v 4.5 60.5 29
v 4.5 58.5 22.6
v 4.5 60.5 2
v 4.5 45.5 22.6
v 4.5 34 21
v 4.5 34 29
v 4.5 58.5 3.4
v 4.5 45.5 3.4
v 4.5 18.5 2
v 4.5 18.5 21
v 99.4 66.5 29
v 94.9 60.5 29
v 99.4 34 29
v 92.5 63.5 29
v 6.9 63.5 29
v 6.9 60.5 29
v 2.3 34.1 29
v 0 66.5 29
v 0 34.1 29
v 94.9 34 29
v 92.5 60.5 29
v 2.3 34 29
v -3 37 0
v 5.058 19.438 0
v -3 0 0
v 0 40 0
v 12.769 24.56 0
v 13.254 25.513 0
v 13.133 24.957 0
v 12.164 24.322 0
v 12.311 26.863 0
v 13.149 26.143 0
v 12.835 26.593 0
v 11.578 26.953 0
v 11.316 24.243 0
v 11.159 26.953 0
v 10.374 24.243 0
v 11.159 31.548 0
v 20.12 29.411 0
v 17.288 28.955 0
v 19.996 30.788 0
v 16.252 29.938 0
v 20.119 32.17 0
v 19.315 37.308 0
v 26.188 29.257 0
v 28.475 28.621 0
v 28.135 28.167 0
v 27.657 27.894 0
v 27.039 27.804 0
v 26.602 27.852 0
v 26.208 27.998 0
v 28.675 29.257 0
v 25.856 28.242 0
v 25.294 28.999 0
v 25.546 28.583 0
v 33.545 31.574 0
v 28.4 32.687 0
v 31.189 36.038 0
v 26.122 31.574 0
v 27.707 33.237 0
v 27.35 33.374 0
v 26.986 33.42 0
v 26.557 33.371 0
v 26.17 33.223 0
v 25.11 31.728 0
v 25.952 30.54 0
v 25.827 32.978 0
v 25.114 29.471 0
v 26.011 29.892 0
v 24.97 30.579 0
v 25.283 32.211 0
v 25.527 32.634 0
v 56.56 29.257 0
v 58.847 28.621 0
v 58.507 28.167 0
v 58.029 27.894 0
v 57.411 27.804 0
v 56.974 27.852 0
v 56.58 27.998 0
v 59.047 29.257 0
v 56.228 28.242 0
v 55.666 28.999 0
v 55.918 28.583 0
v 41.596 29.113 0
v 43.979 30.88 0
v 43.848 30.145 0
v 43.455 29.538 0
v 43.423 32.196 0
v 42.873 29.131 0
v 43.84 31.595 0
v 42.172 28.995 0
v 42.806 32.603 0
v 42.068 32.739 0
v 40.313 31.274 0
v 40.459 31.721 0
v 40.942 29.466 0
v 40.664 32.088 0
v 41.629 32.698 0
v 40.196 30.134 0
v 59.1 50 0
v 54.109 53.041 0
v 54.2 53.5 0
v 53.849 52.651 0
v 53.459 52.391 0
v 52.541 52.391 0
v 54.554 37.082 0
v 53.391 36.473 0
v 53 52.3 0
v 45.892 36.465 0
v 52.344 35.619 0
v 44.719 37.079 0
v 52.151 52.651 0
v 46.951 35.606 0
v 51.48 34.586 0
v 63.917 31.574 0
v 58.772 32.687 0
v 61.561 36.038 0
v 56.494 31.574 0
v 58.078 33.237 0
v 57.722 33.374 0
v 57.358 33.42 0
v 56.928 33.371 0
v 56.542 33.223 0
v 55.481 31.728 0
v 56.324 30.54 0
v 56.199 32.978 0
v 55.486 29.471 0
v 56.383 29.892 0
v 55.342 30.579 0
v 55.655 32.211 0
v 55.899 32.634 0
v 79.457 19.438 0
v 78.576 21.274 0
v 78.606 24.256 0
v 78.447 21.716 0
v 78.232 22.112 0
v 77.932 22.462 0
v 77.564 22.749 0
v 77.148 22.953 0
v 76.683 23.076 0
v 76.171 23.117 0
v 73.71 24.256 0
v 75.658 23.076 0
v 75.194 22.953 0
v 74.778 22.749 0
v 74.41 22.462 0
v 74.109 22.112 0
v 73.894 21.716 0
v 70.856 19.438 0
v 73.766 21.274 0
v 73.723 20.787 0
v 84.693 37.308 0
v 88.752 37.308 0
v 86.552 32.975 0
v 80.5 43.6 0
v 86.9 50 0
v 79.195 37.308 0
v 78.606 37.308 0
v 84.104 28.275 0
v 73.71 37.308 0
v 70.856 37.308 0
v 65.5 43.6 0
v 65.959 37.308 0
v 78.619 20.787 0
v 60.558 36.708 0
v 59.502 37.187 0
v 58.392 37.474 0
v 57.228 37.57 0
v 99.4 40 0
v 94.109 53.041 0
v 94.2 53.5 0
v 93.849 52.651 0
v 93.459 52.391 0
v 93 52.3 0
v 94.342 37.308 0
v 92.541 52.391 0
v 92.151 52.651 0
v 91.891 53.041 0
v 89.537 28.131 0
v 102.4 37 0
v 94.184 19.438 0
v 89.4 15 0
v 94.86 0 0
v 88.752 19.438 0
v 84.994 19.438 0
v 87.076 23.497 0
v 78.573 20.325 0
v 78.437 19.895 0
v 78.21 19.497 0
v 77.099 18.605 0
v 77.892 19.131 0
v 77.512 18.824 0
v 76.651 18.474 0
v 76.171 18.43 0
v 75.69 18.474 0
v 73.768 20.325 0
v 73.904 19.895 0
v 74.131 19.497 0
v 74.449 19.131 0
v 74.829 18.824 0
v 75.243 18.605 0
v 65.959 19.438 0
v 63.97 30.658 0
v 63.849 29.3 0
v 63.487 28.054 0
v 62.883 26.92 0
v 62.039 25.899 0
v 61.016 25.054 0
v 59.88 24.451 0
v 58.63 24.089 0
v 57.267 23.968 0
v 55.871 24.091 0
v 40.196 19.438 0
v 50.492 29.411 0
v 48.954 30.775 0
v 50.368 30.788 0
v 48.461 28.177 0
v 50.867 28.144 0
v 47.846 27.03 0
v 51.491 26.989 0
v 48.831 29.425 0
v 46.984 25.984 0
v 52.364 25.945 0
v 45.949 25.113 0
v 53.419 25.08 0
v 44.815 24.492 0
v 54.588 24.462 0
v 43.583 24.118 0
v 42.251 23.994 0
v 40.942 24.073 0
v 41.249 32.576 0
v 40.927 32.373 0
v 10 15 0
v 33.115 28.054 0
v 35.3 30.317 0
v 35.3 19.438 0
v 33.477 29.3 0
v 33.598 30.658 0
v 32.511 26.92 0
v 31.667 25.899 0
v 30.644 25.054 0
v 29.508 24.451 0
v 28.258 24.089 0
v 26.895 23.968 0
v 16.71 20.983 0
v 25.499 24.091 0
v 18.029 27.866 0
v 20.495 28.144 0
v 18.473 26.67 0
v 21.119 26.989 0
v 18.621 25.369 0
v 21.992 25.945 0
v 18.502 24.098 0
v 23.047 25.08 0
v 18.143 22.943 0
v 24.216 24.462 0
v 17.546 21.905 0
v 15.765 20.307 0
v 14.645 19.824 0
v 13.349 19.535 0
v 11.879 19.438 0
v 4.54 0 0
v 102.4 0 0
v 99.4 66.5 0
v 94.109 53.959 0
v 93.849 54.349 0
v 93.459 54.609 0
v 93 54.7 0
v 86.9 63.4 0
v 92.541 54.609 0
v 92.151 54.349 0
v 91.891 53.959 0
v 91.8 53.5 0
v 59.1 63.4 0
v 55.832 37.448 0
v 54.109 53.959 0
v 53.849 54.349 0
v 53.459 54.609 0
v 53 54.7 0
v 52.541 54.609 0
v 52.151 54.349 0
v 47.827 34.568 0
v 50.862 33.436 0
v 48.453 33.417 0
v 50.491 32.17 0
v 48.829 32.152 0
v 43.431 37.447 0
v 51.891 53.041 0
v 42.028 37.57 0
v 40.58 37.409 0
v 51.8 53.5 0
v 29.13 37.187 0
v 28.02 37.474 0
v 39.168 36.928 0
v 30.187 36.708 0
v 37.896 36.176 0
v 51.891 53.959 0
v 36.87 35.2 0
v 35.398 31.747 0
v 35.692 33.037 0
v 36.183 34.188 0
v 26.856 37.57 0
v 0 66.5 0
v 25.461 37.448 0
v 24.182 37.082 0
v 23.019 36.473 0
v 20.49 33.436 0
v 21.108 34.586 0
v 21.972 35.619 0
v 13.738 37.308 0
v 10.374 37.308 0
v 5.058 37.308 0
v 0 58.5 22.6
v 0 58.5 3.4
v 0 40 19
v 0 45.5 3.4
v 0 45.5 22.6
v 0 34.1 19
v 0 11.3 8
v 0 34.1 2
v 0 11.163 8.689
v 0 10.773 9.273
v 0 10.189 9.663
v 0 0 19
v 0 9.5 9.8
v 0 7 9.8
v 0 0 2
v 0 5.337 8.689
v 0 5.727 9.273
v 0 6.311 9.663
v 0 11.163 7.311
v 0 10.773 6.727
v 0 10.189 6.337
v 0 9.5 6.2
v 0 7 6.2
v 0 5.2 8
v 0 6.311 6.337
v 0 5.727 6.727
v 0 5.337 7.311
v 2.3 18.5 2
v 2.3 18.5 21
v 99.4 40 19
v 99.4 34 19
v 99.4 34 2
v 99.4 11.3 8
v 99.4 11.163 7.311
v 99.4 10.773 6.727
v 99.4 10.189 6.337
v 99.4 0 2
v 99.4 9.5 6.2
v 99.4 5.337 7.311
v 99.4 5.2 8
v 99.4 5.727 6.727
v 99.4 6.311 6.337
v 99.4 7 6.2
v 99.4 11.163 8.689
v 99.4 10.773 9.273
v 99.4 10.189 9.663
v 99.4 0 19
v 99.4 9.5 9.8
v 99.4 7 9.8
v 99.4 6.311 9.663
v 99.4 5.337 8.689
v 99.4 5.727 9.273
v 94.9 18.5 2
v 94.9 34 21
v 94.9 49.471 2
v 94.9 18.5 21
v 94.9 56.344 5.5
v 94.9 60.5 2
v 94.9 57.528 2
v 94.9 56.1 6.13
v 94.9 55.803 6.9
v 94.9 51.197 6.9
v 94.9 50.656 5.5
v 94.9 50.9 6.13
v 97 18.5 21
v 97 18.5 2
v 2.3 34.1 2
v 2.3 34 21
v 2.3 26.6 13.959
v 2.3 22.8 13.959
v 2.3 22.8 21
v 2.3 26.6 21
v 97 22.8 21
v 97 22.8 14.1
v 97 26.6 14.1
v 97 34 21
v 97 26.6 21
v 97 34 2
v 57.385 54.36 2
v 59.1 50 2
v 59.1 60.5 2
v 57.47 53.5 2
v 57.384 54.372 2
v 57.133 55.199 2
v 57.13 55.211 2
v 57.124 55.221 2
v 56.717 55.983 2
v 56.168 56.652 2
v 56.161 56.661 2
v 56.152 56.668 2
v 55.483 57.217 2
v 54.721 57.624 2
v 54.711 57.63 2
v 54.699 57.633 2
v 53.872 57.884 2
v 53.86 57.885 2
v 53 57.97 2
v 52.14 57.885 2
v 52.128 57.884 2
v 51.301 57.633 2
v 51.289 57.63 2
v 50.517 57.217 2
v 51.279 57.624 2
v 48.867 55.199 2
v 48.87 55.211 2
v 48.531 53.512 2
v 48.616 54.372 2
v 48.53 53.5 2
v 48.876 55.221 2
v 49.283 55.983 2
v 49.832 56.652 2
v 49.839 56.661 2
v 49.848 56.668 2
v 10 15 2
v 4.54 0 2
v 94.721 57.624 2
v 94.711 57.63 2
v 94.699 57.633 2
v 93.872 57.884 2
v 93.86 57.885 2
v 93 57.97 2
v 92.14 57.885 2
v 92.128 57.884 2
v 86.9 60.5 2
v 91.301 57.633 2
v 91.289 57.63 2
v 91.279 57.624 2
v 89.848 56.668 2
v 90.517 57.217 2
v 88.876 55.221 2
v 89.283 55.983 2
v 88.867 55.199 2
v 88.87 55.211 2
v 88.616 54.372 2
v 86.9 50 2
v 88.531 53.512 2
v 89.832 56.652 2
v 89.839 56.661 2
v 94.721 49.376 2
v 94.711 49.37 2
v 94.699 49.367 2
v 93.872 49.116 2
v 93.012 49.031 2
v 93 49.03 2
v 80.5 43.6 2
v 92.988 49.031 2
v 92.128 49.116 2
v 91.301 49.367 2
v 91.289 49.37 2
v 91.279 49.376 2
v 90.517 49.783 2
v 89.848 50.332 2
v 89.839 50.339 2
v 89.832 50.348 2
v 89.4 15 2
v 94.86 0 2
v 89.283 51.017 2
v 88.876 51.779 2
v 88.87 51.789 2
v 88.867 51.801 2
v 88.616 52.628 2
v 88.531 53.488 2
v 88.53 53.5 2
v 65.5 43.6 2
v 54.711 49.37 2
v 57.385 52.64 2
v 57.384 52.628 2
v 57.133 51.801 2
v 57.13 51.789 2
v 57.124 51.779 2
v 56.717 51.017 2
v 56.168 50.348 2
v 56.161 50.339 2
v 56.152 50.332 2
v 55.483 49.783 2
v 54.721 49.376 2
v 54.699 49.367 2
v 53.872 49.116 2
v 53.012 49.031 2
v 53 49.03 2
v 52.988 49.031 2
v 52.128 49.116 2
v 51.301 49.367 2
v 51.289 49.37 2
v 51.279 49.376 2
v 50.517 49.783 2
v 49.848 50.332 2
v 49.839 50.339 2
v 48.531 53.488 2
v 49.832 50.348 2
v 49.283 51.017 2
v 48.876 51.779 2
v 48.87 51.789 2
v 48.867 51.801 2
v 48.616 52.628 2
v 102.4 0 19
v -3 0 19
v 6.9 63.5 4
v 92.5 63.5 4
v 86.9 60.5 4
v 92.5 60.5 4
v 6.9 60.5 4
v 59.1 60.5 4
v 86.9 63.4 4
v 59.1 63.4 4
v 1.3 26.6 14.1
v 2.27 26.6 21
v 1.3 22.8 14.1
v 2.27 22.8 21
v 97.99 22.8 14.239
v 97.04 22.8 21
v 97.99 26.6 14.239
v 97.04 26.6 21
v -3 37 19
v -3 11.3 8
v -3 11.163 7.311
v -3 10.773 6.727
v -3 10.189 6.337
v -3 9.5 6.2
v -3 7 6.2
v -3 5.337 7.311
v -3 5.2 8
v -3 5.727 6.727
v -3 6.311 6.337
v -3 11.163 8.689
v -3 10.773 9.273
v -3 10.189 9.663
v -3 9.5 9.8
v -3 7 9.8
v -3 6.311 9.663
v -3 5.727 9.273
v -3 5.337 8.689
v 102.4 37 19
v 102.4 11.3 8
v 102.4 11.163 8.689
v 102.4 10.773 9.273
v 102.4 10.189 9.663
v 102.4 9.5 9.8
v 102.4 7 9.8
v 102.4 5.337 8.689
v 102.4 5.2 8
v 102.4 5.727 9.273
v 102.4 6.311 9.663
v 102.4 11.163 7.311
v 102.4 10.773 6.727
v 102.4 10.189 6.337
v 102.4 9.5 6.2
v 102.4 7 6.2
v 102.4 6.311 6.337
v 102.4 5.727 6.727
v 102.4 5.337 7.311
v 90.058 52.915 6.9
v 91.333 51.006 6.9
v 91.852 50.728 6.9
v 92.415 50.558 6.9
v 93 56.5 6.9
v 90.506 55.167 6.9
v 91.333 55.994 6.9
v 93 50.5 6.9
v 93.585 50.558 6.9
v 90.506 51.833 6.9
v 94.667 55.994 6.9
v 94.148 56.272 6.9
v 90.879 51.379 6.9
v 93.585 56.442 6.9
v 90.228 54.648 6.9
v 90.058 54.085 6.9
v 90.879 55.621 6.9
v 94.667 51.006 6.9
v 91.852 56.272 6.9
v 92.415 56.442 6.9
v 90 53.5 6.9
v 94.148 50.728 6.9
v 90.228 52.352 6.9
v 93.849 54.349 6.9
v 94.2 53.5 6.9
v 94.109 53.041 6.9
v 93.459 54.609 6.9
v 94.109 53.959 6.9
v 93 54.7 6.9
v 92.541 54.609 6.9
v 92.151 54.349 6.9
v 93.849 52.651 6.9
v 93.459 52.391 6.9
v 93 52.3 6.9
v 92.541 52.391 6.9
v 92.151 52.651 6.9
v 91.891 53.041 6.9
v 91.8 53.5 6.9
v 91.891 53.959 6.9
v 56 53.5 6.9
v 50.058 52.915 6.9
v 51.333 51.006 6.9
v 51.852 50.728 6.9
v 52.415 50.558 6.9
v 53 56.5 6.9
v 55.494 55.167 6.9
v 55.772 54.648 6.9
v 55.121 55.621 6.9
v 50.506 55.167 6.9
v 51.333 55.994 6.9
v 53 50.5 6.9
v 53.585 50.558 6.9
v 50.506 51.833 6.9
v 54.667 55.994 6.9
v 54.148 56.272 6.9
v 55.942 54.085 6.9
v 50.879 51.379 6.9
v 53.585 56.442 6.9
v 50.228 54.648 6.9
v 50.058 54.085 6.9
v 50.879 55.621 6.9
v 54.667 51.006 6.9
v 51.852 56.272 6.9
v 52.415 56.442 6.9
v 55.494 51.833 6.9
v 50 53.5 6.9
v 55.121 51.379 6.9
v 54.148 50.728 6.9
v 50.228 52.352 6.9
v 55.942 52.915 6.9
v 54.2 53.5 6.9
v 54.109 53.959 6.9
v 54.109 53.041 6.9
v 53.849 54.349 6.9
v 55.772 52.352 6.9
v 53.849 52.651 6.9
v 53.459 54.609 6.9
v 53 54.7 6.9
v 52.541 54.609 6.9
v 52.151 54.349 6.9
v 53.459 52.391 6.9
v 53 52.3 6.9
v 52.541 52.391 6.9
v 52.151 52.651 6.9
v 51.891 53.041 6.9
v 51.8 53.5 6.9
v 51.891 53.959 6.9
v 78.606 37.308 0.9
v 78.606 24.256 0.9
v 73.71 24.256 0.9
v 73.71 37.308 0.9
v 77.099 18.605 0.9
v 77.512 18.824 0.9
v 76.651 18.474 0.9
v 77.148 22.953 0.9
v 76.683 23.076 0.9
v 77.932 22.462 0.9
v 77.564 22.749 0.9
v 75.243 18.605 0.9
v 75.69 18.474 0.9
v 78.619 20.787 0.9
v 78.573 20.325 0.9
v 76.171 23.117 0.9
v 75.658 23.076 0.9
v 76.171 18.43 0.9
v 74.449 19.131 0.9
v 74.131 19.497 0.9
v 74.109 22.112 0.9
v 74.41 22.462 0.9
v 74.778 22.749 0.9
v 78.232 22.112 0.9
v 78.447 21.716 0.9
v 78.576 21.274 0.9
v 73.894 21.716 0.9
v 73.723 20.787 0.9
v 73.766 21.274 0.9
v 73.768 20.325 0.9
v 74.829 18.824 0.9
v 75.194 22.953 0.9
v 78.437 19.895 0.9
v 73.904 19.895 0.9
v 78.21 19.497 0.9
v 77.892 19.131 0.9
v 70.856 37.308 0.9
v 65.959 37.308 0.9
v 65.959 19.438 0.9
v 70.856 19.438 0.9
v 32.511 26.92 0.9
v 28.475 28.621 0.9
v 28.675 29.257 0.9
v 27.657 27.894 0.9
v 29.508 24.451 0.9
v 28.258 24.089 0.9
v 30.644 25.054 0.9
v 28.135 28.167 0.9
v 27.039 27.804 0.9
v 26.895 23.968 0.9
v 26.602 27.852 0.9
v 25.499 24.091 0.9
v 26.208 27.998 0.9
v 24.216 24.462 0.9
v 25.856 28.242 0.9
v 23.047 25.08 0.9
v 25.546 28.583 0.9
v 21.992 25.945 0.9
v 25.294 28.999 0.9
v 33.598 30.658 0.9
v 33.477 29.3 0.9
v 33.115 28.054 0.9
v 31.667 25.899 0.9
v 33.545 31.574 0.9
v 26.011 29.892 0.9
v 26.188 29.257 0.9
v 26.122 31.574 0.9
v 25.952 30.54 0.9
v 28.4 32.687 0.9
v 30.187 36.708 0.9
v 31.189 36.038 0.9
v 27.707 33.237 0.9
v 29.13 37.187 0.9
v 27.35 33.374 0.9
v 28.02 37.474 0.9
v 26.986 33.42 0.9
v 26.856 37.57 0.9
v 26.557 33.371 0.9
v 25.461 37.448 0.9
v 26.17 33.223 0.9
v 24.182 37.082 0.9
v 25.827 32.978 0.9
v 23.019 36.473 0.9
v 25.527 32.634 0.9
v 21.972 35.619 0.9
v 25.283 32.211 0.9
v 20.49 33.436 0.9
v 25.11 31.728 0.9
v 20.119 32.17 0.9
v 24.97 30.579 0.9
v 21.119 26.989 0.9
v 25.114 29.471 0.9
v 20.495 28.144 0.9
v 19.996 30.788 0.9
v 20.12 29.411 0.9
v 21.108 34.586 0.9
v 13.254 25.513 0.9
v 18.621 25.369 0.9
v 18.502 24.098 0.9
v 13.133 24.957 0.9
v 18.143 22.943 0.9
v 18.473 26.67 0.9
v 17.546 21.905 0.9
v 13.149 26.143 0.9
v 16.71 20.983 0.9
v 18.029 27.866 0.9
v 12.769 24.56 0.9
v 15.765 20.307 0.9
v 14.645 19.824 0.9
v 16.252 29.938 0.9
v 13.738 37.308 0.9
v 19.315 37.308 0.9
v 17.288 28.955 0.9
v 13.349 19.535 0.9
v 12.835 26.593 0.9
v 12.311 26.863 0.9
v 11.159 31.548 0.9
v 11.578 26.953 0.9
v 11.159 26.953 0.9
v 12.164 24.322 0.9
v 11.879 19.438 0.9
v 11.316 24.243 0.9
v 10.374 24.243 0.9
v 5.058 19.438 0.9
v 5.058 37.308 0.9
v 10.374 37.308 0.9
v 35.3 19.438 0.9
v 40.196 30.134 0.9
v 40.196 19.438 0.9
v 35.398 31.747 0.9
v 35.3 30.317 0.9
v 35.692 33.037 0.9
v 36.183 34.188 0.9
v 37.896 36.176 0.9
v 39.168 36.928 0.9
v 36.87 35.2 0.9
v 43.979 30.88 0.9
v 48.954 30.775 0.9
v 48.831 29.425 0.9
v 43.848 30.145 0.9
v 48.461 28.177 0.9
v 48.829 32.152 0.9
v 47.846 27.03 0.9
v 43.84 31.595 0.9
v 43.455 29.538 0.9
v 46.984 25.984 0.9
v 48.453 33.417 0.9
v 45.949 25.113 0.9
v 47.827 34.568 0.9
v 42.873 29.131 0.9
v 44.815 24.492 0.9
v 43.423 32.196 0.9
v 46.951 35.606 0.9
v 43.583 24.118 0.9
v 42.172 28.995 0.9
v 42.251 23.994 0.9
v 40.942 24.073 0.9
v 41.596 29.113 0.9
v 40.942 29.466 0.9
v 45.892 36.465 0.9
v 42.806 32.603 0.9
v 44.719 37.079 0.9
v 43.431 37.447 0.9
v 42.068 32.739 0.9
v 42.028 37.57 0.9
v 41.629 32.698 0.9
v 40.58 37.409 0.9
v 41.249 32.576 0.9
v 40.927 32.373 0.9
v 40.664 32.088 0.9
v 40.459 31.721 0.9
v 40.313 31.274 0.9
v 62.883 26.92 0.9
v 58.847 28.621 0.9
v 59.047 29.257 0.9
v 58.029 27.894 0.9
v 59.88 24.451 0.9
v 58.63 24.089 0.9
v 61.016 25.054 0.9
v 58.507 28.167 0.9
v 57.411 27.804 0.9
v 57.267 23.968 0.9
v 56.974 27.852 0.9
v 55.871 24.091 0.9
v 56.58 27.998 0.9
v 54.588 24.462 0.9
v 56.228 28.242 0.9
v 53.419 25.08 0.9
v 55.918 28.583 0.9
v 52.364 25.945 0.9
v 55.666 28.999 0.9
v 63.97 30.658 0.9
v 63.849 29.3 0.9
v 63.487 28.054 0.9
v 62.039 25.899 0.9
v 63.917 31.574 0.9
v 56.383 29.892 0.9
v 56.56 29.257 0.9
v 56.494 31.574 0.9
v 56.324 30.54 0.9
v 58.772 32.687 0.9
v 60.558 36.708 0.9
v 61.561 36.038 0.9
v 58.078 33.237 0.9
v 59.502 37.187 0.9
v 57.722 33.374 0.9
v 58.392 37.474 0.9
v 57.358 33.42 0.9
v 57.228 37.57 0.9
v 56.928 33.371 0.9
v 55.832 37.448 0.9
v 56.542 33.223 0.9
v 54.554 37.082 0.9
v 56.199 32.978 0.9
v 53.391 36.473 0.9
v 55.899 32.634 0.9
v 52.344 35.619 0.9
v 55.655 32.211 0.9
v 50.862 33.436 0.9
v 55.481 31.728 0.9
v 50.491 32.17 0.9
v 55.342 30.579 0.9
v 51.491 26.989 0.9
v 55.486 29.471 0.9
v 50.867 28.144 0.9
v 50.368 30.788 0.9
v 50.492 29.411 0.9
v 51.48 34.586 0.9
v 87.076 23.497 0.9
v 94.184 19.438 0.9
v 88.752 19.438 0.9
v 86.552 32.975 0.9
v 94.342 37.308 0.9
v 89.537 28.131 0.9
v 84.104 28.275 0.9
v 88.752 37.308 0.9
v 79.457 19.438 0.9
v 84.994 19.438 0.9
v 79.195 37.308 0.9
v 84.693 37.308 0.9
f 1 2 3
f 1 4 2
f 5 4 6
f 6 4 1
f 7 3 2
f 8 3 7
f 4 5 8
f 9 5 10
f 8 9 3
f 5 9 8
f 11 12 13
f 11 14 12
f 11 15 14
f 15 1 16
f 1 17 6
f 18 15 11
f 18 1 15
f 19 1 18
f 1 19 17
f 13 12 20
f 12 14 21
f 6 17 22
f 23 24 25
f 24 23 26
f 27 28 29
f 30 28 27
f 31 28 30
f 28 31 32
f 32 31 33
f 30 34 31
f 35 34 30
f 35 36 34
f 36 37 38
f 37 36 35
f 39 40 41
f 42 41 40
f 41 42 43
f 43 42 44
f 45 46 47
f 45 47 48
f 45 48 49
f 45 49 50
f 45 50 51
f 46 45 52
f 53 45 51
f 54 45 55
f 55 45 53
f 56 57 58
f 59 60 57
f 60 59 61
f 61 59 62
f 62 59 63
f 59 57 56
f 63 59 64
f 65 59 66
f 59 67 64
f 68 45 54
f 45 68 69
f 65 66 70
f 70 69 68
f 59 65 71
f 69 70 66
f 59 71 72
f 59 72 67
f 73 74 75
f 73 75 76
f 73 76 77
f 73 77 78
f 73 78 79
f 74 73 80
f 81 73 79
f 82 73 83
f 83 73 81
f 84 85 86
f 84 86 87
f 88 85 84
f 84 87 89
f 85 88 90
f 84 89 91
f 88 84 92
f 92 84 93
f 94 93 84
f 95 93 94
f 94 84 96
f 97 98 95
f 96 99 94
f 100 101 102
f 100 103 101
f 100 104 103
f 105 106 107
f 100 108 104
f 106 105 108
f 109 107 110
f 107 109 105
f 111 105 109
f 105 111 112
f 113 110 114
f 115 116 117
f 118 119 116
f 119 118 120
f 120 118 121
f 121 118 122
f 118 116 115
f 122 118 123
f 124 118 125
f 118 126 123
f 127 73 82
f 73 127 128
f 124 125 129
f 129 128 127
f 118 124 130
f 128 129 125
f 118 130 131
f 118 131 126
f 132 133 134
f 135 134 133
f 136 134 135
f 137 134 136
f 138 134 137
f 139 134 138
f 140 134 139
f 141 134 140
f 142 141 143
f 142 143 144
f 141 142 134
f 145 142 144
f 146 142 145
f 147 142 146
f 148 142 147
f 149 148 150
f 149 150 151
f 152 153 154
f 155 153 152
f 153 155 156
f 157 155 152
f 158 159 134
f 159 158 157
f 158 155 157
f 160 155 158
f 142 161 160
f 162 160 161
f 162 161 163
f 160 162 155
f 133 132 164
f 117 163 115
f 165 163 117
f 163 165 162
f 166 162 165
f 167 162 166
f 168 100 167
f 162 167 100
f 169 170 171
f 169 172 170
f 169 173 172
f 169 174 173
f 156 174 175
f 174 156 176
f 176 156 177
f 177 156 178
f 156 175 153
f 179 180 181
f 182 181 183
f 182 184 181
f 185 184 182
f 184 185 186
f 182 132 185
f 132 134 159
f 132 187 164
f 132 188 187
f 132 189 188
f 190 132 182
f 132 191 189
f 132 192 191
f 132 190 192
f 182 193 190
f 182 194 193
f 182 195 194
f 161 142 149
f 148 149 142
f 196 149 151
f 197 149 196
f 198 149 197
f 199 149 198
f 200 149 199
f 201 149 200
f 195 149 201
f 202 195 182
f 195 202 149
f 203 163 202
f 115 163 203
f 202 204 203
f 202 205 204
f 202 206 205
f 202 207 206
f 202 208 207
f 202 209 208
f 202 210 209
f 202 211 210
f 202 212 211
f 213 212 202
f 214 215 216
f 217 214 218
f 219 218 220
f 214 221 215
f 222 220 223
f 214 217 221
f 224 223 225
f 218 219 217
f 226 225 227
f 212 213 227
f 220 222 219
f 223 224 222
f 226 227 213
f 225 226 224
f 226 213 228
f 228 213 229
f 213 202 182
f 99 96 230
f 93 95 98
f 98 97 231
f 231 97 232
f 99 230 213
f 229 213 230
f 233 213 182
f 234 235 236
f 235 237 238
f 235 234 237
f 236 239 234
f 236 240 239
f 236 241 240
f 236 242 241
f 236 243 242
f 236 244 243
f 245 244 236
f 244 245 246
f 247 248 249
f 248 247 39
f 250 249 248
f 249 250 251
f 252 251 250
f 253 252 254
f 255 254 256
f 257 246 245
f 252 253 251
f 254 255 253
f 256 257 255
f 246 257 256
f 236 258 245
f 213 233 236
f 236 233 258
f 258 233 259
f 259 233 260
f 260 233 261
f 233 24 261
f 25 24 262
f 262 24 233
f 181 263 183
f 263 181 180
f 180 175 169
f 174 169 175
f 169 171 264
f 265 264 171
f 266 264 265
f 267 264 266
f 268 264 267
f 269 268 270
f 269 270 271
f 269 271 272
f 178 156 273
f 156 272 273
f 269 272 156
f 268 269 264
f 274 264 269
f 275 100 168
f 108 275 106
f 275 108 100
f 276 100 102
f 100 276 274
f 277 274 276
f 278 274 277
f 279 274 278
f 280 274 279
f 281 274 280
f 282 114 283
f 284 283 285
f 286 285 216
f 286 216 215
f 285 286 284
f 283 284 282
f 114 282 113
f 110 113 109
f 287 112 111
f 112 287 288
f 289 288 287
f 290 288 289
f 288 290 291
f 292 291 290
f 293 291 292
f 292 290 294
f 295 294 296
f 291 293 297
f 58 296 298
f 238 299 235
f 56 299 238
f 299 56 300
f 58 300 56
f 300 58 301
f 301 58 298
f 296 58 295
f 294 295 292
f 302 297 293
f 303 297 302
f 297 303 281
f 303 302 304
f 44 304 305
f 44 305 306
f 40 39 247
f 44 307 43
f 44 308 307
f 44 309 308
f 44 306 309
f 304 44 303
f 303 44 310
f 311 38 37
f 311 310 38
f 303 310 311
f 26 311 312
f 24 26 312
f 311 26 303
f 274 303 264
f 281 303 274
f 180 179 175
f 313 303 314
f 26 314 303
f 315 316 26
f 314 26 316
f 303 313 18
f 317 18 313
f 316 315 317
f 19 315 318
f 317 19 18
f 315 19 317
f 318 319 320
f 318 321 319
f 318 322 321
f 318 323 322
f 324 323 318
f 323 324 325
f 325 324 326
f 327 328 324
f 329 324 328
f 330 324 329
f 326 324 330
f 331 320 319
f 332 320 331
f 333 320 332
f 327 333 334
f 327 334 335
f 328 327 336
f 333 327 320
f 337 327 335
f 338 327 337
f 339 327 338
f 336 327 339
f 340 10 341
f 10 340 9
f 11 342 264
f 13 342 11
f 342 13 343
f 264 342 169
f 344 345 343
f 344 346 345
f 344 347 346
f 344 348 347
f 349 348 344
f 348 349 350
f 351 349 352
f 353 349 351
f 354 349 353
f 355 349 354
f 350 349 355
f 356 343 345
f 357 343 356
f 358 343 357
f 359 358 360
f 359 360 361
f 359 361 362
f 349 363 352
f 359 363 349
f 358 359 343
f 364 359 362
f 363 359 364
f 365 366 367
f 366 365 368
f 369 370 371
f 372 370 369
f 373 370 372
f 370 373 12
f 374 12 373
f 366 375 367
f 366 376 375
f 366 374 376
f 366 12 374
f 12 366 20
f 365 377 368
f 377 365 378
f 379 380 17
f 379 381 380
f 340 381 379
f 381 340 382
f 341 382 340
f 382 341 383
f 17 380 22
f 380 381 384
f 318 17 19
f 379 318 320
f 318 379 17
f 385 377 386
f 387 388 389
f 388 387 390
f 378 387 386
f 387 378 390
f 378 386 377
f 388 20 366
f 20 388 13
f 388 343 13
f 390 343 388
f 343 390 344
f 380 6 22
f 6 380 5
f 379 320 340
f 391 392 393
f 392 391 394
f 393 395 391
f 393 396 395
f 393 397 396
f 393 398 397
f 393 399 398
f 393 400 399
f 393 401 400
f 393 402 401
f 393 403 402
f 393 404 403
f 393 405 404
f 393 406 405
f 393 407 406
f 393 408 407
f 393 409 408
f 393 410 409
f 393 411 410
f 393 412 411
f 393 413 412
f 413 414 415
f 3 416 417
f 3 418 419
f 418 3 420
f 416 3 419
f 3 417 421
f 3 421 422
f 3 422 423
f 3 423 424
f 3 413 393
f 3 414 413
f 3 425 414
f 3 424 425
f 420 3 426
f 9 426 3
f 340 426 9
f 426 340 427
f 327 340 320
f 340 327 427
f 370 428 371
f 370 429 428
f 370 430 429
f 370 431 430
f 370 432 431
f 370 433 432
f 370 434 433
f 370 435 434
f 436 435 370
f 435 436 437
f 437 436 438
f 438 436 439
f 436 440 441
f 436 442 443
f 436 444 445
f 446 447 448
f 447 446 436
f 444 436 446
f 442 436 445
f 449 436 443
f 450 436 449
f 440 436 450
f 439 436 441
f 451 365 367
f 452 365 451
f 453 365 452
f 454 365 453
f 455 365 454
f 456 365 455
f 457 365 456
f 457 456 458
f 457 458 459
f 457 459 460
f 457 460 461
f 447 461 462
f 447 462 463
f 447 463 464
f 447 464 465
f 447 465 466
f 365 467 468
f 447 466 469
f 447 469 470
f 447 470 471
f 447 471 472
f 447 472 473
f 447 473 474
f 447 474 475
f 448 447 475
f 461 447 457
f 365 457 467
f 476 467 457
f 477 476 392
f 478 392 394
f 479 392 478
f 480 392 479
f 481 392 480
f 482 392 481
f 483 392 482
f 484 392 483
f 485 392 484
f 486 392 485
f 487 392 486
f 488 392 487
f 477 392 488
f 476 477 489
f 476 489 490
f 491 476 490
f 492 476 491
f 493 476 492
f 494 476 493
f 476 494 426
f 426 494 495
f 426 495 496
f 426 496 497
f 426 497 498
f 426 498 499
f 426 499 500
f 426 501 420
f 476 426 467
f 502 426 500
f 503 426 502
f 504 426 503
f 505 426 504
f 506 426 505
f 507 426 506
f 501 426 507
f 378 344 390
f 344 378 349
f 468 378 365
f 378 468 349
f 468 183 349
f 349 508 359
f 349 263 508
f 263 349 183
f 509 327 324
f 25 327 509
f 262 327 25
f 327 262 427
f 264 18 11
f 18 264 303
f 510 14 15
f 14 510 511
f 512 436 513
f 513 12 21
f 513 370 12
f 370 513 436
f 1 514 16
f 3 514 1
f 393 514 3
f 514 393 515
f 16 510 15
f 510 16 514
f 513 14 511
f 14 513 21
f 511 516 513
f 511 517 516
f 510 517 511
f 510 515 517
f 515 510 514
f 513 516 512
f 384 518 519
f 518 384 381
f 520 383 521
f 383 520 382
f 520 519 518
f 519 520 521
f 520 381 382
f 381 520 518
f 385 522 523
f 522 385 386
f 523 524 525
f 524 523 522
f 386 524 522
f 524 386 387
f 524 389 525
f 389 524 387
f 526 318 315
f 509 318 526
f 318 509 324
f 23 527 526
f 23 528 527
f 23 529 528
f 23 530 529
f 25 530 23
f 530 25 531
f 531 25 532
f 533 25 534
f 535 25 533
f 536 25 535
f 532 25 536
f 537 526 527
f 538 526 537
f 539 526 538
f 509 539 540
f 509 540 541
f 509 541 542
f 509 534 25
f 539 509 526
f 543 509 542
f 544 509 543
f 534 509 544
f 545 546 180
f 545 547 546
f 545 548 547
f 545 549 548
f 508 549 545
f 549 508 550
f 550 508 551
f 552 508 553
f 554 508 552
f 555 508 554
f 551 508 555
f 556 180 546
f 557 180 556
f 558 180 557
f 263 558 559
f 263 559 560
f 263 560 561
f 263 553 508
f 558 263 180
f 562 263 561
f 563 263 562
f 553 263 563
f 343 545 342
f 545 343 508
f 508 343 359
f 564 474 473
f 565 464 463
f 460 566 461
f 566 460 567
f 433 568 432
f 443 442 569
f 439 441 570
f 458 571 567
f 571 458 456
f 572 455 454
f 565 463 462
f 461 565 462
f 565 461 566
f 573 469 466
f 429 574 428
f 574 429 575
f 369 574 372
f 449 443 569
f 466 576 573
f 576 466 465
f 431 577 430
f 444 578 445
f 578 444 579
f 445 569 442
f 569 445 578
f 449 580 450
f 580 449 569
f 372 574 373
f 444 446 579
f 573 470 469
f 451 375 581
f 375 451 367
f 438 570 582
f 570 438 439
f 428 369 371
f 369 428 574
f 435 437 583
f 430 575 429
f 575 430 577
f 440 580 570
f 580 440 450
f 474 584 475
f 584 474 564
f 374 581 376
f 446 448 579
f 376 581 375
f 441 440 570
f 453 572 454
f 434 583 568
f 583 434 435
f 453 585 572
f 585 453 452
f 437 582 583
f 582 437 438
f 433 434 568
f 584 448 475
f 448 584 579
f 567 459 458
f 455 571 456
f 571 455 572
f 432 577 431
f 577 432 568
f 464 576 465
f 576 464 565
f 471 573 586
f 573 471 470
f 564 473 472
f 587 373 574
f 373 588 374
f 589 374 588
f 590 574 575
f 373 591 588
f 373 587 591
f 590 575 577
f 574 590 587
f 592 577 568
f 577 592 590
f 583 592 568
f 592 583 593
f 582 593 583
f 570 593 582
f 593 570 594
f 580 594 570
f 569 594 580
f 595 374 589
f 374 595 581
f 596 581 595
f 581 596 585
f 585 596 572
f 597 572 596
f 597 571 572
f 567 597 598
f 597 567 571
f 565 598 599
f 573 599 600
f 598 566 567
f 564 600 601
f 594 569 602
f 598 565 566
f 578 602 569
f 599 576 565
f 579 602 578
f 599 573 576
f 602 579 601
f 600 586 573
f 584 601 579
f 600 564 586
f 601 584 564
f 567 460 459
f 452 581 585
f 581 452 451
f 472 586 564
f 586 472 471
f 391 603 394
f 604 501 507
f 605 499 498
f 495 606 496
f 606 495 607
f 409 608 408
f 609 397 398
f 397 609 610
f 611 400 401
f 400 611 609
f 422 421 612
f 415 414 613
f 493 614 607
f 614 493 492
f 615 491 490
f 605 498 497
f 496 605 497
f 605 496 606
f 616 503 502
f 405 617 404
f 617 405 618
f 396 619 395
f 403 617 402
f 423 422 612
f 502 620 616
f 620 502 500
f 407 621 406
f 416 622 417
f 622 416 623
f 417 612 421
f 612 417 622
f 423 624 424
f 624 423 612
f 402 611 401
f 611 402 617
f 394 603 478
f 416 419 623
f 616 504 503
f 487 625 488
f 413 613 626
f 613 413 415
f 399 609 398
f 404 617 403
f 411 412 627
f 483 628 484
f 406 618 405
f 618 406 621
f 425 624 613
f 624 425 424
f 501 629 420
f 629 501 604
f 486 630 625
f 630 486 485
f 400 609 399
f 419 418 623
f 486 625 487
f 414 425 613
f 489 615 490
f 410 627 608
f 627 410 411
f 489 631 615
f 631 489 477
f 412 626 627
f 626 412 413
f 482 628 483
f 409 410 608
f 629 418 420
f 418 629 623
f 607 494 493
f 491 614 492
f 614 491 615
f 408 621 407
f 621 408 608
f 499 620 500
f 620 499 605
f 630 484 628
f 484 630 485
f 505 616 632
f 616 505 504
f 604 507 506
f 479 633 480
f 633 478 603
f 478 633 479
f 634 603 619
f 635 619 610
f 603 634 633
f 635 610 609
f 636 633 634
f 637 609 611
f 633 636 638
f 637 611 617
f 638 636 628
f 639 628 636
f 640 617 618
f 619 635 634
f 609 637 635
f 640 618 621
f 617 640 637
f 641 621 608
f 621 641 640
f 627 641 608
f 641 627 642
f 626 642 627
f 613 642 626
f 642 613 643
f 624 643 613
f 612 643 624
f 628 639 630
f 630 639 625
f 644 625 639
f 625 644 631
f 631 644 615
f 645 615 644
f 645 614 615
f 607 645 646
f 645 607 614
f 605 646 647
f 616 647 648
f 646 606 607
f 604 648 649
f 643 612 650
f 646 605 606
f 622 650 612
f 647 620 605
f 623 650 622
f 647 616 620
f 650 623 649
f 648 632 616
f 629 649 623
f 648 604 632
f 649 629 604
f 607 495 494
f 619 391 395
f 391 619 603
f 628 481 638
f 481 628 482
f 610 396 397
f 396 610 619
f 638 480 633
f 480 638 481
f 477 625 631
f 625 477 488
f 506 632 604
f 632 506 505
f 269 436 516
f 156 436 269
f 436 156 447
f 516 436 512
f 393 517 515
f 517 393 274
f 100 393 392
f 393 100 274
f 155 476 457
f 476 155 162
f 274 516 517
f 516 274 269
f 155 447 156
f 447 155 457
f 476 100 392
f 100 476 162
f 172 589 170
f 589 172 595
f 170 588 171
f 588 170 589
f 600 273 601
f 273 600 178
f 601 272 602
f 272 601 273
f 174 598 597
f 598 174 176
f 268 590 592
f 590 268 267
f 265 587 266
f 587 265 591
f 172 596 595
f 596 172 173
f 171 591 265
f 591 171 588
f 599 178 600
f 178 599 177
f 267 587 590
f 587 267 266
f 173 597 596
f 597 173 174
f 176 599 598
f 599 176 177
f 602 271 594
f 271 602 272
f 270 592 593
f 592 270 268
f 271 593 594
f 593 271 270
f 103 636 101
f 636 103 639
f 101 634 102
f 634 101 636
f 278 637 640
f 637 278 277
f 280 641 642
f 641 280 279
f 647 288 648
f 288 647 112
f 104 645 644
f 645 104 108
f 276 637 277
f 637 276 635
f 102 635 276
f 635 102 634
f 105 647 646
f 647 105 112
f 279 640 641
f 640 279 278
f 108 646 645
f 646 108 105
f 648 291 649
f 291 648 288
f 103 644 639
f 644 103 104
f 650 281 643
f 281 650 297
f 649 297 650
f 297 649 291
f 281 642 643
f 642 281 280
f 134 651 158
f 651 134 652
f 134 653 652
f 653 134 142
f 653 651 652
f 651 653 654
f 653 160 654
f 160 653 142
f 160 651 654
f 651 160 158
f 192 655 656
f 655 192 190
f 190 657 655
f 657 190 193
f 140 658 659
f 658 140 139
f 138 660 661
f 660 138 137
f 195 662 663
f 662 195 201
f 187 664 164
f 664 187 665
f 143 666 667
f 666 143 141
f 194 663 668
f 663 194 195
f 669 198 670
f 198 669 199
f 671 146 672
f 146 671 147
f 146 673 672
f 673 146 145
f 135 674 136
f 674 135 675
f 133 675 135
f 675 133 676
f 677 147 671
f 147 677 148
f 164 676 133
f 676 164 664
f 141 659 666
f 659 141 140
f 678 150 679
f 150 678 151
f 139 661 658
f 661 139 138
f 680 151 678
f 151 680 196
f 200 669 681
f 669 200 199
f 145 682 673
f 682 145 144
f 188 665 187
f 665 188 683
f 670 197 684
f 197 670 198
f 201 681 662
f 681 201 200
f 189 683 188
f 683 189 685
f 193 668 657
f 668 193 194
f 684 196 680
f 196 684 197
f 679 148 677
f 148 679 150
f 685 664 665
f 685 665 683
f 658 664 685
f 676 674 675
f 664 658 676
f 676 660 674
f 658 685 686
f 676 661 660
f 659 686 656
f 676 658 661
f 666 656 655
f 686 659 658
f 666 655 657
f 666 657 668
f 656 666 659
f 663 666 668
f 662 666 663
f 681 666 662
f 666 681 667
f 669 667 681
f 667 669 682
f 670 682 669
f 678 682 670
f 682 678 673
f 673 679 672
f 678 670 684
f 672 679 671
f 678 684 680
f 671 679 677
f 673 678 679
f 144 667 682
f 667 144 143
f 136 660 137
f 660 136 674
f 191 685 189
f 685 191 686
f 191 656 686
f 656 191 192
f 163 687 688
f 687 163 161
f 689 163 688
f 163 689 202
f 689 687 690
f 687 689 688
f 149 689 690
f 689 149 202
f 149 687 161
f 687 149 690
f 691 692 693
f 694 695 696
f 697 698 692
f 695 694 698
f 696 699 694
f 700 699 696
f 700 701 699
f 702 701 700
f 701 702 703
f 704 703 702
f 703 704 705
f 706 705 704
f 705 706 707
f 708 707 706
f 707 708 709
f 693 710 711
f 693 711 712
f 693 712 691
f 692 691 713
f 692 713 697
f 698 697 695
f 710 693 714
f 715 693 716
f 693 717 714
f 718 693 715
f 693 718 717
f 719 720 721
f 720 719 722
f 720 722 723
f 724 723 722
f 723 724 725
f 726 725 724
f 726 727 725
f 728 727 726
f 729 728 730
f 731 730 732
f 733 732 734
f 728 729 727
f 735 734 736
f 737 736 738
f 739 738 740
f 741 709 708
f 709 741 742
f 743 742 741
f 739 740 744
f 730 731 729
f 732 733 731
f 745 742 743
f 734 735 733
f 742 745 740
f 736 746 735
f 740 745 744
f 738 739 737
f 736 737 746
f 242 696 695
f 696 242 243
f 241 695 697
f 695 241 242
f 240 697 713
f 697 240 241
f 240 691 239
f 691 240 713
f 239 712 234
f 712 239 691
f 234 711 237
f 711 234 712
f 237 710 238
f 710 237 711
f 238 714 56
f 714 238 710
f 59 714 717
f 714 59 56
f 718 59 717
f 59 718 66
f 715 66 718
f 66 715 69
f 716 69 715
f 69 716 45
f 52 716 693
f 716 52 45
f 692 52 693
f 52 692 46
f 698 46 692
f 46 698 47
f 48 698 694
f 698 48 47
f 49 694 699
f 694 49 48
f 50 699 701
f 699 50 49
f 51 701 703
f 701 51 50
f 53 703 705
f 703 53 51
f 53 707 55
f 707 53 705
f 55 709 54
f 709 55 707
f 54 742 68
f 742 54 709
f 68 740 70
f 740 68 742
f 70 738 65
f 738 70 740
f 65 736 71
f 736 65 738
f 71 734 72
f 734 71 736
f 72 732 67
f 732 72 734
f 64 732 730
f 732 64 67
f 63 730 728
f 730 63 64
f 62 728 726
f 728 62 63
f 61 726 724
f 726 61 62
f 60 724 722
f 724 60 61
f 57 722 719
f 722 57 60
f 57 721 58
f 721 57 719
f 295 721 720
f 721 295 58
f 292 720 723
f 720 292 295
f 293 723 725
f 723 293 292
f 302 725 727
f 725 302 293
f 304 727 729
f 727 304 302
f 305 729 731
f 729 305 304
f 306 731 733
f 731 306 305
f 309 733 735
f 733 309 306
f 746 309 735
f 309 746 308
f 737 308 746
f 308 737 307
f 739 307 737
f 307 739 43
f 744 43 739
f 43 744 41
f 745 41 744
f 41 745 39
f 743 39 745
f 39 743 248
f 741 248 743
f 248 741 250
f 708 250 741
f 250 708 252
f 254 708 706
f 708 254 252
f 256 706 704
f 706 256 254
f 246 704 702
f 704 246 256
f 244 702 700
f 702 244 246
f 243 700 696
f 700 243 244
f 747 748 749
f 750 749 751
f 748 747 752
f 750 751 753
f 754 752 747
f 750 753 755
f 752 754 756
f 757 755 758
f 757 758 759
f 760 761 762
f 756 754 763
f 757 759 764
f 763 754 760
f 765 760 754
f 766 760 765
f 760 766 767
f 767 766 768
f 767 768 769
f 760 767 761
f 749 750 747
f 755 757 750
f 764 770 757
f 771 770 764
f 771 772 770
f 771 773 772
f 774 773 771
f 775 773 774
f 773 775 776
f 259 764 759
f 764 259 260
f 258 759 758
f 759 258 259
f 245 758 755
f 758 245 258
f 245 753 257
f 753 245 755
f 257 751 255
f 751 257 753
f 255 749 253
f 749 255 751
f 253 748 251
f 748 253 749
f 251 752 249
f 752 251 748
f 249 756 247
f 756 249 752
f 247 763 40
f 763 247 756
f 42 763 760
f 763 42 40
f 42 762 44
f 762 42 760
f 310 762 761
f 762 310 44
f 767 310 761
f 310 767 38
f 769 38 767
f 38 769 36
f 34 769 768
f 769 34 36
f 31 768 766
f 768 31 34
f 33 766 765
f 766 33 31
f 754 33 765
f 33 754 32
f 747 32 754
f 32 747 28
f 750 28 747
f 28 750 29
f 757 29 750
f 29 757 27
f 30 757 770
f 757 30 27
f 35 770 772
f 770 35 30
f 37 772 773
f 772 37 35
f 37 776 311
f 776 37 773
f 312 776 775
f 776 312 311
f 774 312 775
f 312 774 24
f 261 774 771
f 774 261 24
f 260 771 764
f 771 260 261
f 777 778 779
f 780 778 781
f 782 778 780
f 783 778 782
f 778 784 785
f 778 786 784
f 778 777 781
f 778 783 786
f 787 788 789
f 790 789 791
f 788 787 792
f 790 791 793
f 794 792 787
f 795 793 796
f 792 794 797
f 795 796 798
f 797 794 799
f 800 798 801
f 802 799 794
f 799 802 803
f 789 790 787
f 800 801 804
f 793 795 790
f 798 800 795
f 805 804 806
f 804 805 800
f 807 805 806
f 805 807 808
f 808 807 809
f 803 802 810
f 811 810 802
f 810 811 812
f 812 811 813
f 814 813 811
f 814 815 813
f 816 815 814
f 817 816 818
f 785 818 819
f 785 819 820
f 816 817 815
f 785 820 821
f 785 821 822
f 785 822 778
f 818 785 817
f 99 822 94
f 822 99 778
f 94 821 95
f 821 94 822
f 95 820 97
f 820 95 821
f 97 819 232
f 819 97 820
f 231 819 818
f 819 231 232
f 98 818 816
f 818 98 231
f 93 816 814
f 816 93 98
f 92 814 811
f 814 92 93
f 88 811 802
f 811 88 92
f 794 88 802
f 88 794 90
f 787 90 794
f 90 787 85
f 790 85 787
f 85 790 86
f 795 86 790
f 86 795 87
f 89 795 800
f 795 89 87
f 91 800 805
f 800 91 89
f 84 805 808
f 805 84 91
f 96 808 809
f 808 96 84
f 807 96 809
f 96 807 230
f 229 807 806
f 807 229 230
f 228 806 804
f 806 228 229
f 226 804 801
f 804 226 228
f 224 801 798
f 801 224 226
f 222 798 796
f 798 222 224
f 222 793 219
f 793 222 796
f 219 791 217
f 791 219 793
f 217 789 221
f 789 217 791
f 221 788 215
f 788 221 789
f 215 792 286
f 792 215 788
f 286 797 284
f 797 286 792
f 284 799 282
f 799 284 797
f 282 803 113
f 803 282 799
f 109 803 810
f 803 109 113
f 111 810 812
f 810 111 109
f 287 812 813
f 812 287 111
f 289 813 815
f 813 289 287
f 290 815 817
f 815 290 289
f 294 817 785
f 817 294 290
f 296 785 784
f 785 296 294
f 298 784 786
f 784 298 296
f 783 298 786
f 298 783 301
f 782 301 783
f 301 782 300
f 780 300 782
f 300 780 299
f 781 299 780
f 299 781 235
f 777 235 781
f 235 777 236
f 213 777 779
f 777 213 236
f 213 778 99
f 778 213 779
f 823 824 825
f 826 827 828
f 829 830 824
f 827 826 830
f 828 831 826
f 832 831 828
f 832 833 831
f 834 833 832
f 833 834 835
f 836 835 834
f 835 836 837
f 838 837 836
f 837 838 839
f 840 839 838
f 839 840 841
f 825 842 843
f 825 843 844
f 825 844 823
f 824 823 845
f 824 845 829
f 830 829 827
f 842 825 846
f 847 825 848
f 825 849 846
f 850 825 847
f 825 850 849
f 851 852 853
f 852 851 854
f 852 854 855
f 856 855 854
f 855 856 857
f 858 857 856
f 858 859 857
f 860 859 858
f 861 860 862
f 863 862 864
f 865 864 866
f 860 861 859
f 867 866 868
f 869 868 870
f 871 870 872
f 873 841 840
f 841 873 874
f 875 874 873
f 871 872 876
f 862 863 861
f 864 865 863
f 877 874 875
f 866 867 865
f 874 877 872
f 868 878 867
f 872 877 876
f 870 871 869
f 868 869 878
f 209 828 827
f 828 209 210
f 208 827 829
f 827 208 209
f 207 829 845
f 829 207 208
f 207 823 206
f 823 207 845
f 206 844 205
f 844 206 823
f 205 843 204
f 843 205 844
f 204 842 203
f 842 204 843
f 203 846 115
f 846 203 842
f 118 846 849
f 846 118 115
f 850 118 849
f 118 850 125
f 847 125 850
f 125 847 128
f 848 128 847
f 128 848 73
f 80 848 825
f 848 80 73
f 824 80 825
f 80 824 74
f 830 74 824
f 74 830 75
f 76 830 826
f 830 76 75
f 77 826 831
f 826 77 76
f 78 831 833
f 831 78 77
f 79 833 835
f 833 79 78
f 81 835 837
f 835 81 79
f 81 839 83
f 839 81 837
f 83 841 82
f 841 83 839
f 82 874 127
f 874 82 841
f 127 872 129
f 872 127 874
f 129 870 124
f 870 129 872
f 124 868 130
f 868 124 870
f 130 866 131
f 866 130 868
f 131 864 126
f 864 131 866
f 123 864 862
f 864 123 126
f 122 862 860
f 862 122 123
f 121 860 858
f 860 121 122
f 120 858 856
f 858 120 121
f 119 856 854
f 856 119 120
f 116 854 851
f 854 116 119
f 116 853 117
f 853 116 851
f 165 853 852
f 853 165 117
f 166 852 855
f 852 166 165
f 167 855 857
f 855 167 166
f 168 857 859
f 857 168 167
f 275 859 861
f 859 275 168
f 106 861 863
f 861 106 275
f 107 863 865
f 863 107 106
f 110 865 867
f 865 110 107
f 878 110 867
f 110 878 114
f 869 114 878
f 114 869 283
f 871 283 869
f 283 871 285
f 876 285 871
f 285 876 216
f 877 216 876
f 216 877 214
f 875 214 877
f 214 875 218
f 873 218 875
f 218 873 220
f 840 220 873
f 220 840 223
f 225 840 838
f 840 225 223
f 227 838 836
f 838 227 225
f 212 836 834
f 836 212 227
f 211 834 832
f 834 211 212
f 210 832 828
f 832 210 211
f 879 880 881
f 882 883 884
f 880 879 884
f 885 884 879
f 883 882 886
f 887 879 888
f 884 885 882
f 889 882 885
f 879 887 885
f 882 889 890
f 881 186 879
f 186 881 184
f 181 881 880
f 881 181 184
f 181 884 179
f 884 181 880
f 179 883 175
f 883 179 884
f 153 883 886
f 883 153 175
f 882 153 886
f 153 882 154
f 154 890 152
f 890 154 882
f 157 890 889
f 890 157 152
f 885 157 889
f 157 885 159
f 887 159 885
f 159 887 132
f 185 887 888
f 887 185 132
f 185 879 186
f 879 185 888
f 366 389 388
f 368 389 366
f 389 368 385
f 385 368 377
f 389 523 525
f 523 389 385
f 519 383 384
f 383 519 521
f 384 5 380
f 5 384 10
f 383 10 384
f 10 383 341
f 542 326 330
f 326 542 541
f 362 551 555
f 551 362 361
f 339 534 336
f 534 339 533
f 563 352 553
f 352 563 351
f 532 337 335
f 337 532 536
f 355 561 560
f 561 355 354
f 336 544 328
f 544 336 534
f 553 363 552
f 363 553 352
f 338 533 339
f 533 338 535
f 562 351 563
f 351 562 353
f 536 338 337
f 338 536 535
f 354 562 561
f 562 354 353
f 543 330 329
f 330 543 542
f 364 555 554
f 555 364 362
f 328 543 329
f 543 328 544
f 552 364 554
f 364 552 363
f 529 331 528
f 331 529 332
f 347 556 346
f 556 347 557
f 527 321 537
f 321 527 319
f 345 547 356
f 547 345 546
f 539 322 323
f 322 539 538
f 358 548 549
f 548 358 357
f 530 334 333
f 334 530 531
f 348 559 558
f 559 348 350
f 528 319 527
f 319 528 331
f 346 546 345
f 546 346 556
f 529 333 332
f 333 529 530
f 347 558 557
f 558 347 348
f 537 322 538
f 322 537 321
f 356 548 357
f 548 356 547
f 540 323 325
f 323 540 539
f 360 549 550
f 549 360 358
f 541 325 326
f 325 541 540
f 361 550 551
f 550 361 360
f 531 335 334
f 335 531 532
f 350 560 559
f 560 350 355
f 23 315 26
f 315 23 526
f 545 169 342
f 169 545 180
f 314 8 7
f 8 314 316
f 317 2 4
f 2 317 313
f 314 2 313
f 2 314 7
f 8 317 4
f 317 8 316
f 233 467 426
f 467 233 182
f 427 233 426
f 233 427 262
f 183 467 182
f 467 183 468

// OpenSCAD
// file: ../../inc/text_RebeliX.scad
// Module names are of the form poly_<inkscape-path-id>().  As a result,
// you can associate a polygon in this OpenSCAD program with the corresponding
// SVG element in the Inkscape document by looking for the XML element with
// the attribute id="inkscape-path-id".

// fudge value is used to ensure that subtracted solids are a tad taller
// in the z dimension than the polygon being subtracted from.  This helps
// keep the resulting .stl file manifold.
fudge = 0.1;

module poly_path3169(h)
{
  scale([25.4/90, -25.4/90, 1]) union()
  {
    linear_extrude(height=h)
      polygon([[74.960940,-30.336910],[74.960940,32.980960],[57.612310,32.980960],[57.612310,-30.336910]]);
  }
}

module poly_path3163(h)
{
  scale([25.4/90, -25.4/90, 1]) union()
  {
    linear_extrude(height=h)
      polygon([[-57.241210,12.663580],[-83.542480,12.663580],[-84.145510,8.999020],[-83.936785,6.702904],[-83.310550,4.453130],[-74.497070,4.453130],[-75.207384,2.200490],[-76.410545,0.591455],[-78.106554,-0.373975],[-80.295410,-0.695800],[-81.843581,-0.523282],[-83.240985,-0.005773],[-84.487624,0.856725],[-85.583500,2.064210],[-86.476452,3.541354],[-87.114271,5.212729],[-87.624510,9.138180],[-87.131669,13.208634],[-86.515593,14.922040],[-85.653080,16.420900],[-84.590546,17.638558],[-83.374347,18.508312],[-82.004486,19.030160],[-80.480960,19.204100],[-79.193740,19.041757],[-77.929706,18.554700],[-75.471190,16.606450],[-65.590820,28.481450],[-69.142321,30.855868],[-72.885155,32.551880],[-76.819321,33.569488],[-80.944820,33.908690],[-85.887918,33.476714],[-90.419325,32.180786],[-94.539042,30.020905],[-98.247070,26.997070],[-101.311495,23.335423],[-103.500369,19.262092],[-104.813691,14.777075],[-105.251460,9.880370],[-104.809342,4.998187],[-103.482975,0.510280],[-101.272357,-3.583352],[-98.177490,-7.282710],[-94.439019,-10.347111],[-90.297559,-12.535976],[-85.753107,-13.849308],[-80.805660,-14.287110],[-75.974212,-13.859454],[-71.545737,-12.576562],[-67.520234,-10.438434],[-63.897700,-7.445070],[-60.904336,-3.825435],[-58.766207,0.191373],[-57.483316,4.605353],[-57.055660,9.416510],[-57.241210,12.663580]]);
  }
}

module poly_path3161(h)
{
  scale([25.4/90, -25.4/90, 1]) union()
  {
    linear_extrude(height=h)
      polygon([[-139.345700,-13.312990],[-139.345700,32.980960],[-158.178710,32.980960],[-158.178710,-30.336910],[-134.011230,-30.336910],[-128.801443,-29.994775],[-124.212065,-28.968459],[-120.243095,-27.257961],[-116.894530,-24.863280],[-113.931608,-21.595888],[-111.815224,-17.916832],[-110.545377,-13.826113],[-110.122070,-9.323730],[-110.646849,-4.711132],[-112.221109,-0.475439],[-114.844850,3.383352],[-118.518070,6.865240],[-107.663570,32.980960],[-127.424320,32.980960],[-136.562500,12.570800],[-136.562500,-3.710940],[-135.078120,-3.710940],[-132.480483,-4.029825],[-130.625022,-4.986543],[-129.511735,-6.581093],[-129.140620,-8.813480],[-129.569720,-10.781990],[-130.856959,-12.188077],[-133.002339,-13.031743],[-136.005860,-13.312990]]);
  }
}

module poly_path3165(h)
{
  scale([25.4/90, -25.4/90, 1]) union()
  {
    linear_extrude(height=h)
      polygon([[-33.676760,-30.336910],[-33.676760,7.561040],[-33.262190,11.599593],[-32.743966,13.186166],[-32.018450,14.484269],[-31.085641,15.493903],[-29.945540,16.215067],[-28.598146,16.647763],[-27.043460,16.791990],[-24.428426,16.310744],[-22.242430,14.866940],[-20.763879,12.738967],[-20.271000,10.205080],[-20.734889,7.601642],[-22.126460,5.450440],[-24.190692,4.006674],[-26.672360,3.525390],[-28.713395,3.942892],[-31.032710,5.195310],[-31.032710,-13.916010],[-26.394040,-14.194330],[-21.675662,-13.753634],[-17.308071,-12.431605],[-13.291265,-10.228244],[-9.625240,-7.143550],[-6.570995,-3.438394],[-4.389379,0.626248],[-3.080394,5.050376],[-2.644040,9.833990],[-3.087641,14.713297],[-4.418369,19.192514],[-6.636225,23.271641],[-9.741210,26.950680],[-13.492759,29.994812],[-17.650175,32.169190],[-22.213461,33.473815],[-27.182620,33.908690],[-32.314164,33.340452],[-37.318110,31.635740],[-41.823436,28.968510],[-45.458980,25.512700],[-47.894289,21.926430],[-49.633791,17.847300],[-50.677491,13.275307],[-51.025390,8.210450],[-51.025390,-30.336910]]);
  }
}

module poly_path3167(h)
{
  scale([25.4/90, -25.4/90, 1]) union()
  {
    linear_extrude(height=h)
      polygon([[50.375980,12.663580],[24.074710,12.663580],[23.471680,8.999020],[23.680405,6.702904],[24.306640,4.453130],[33.120120,4.453130],[32.409806,2.200490],[31.206645,0.591455],[29.510636,-0.373975],[27.321780,-0.695800],[25.773609,-0.523282],[24.376205,-0.005773],[23.129566,0.856725],[22.033690,2.064210],[21.140734,3.541354],[20.502915,5.212729],[19.992680,9.138180],[20.485521,13.208634],[21.101597,14.922040],[21.964110,16.420900],[23.026644,17.638558],[24.242843,18.508312],[25.612704,19.030160],[27.136230,19.204100],[28.423444,19.041757],[29.687476,18.554700],[32.146000,16.606450],[42.026370,28.481450],[38.474864,30.855868],[34.732030,32.551880],[30.797863,33.569488],[26.672360,33.908690],[21.729267,33.476714],[17.197864,32.180786],[13.078148,30.020905],[9.370120,26.997070],[6.305695,23.335423],[4.116820,19.262092],[2.803495,14.777075],[2.365720,9.880370],[2.807843,4.998187],[4.134214,0.510280],[6.344832,-3.583352],[9.439700,-7.282710],[13.178171,-10.347111],[17.319630,-12.535976],[21.864079,-13.849308],[26.811520,-14.287110],[31.642968,-13.859454],[36.071443,-12.576562],[40.096946,-10.438434],[43.719480,-7.445070],[46.712849,-3.825435],[48.850976,0.191373],[50.133866,4.605353],[50.561520,9.416510],[50.375980,12.663580]]);
  }
}

module poly_path3171(h)
{
  scale([25.4/90, -25.4/90, 1]) union()
  {
    linear_extrude(height=h)
      polygon([[102.421880,-13.266600],[102.421880,32.980960],[85.073240,32.980960],[85.073240,-13.266600]]);
    linear_extrude(height=h)
      polygon([[93.793950,-33.908690],[95.497200,-33.753545],[97.081591,-33.288215],[98.547124,-32.512700],[99.893800,-31.427000],[101.020116,-30.129588],[101.824631,-28.719131],[102.307345,-27.195629],[102.468260,-25.559080],[102.316042,-23.831146],[101.859419,-22.265584],[101.098391,-20.862395],[100.032960,-19.621580],[98.729775,-18.606843],[97.255545,-17.882040],[95.610270,-17.447172],[93.793950,-17.302240],[91.977613,-17.447172],[90.332331,-17.882040],[88.858104,-18.606843],[87.554930,-19.621580],[86.489482,-20.862395],[85.728449,-22.265584],[85.271831,-23.831146],[85.119630,-25.559080],[85.280529,-27.195629],[85.763240,-28.719131],[86.567761,-30.129588],[87.694090,-31.427000],[89.040749,-32.512700],[90.506278,-33.288215],[92.090677,-33.753545],[93.793950,-33.908690]]);
  }
}

module poly_path3173(h)
{
  scale([25.4/90, -25.4/90, 1]) union()
  {
    linear_extrude(height=h)
      polygon([[157.622070,-30.336910],[141.154790,0.463870],[158.178710,32.980960],[138.371580,32.980960],[130.578610,17.626950],[123.991700,32.980960],[104.509280,32.980960],[121.904300,0.974120],[105.437010,-30.336910],[125.058590,-30.336910],[132.434080,-15.957030],[138.371580,-30.336910]]);
  }
}

module text_RebeliX(h)
{

poly_path3169(h);
poly_path3163(h);
poly_path3161(h);
poly_path3165(h);
poly_path3167(h);
poly_path3171(h);
poly_path3173(h);
}

text_RebeliX(2);
// file: ../../../configuration.scad
/*
	Konfiguracni soubor 3D tiskarny RebeliX X2
	
	Sledujte nas na:		  
			www.RepRap4U.cz
			www.facebook.com/RebeliX.cz
			https://twitter.com/reprap4u
			https://plus.google.com/+Reprap4uCz-3Dtiskarna-RebeliX
*/

/*================ Slic3r nastaveni ==========================*/

// Vyska vrstvy pro tisknuti dilu [mm]
layer_height = 0.3;

// Sirka vytlacovaneho materialu [mm]
extrusion_width = 0.66; //Slic3r->Print Settings->Advanced->Default extrusion width

/*==================== M6 sroub ==============================*/

// Rezerva prumeru hlavy sroubu [mm]
space = 1;

// Prumer hlavy M6 sroubu (pricte se rezerva) [mm]
M6_head_diameter = 10.6+space;
//M6_head_diameter = 12+space;

// Prumer M6 sroubu
M6_dia = 6.3;

// Vyska hlavy M6 sroubu (dulezite pro zapusteni hlavy sroubu do plastu) [mm]
M6_head_height = 3.6;
//M6_head_height = 4.5;

// Delka sroubu M6 [mm]
// M6x12
M6_lenght = 12;

/*=================== Nastaveni dilu =========================*/

// Posun Z zakladny
z_base_offset = 11;

// Tloustka rohovych spojek
// 5 mm => sroub M6x14 s podlozkou
// 3 mm => sroub M6x12 s podlozkou
coupler_thickness = 5;

// Prumer 8mm tyce
rod_8mm_d = 8.2;

// Posun drzacku mezi x-motor a x-end
x_holder_position = 6.5;

/*======================== Motory ============================*/

// Delka motoru (ovlivni dily a delky tyci pro osy Z a Y)
//SX17-1003LQFE (doporuceno hlavne na osu Z)
//motor_length = 29.5;
//SX17-1003 (doporuceno hlavne na osu Z), SX17-0503LQEF
motor_length = 34;
//SX17-1005
//motor_length = 40;
//SX17-0905 - zde je jiz problem s velkou vyskou motoru na ose Z - musi se upravit endstop-holder
//motor_length = 48;

/*================ Remeny a remenicky ========================*/

// GT2 
belt_tooth_distance = 2;
belt_tooth_ratio = 0.5;

// T2.5
//belt_tooth_distance = 2.5;
//belt_tooth_ratio = 0.68;
// main file
// RebeliX
//
// Predni kryt zdroje 12V / 240W
// GNU GPL v3
// Martin Neruda <neruda@reprap4u.cz>
// http://www.reprap4u.cz

include <../../../configuration.scad>
use <../../inc/text_RebeliX.scad>

sirka = 99.4;
vyska = 29;
hloubka = 45;
tloustka_steny = 2;
plech_tloustka = 2.4;

hloubka_dilu = hloubka + 2*tloustka_steny + 1.5;

module euro_konektor(){
  difference(){
    cube([27.8,19.8,10],center=true);
    translate([7.5,19.8/2,-10]) rotate([0,0,-45]) cube([20,20,20]);
	translate([-7.5,19.8/2,-10]) rotate([0,0,135]) cube([20,20,20]);
  }
  // Otvory pro srouby
  translate([20,0,0]) cylinder(r=1.2,h=20,$fn=16,center=true);
  translate([-20,0,0]) cylinder(r=1.2,h=20,$fn=16,center=true);
}


module power_base(){
	translate([0,0,0]) cube([sirka,hloubka_dilu+15,tloustka_steny]);
	translate([0,hloubka_dilu-tloustka_steny+15,0]) cube([sirka,tloustka_steny+1,vyska]);
	difference(){
	  union(){
	    translate([0,3.5+15,0]) cube([2.5+tloustka_steny,hloubka_dilu-3.5,vyska]);
	    translate([sirka-2.5-tloustka_steny,3.5+15,0]) cube([2.5+tloustka_steny,hloubka_dilu-3.5,vyska]);
	  }
	  translate([-0.1,15,0]) cube([plech_tloustka,19+0.1,vyska+1]);
	  translate([sirka-plech_tloustka,15,0]) cube([plech_tloustka+0.1,19,vyska+1]);
	}
	// Vyztuhy
	translate([1.9,hloubka_dilu+15,0]) rotate([0,0,0]) rotate([0,0,-90]) cube([5,5,vyska]);
	translate([sirka-1.9,hloubka_dilu+15,0]) rotate([0,0,180]) cube([5,5,vyska]);
	translate([1.9,hloubka_dilu-3-tloustka_steny+15,tloustka_steny]) cube([sirka-2*1.9,3,2]);
	// Nozicky na zacvaknuti do zdroje
	translate([1.3,3.5+4.3+15,tloustka_steny+12.1]) rotate([0,8,0]) cube([2,3.8,vyska-tloustka_steny-12.1]);
	translate([sirka-2.4,3.5+4.3+15,tloustka_steny+12.1]) rotate([0,-8,0]) cube([1,3.8,vyska-tloustka_steny-12.1]);
	
	translate([-3,0,0]) cube([3,40,19]);
	translate([sirka,0,0]) cube([3,40,19]);
	
	// Sloupky pro srouby EURO konektoru
	translate([73+20,hloubka_dilu+3,tloustka_steny-0.1]) rotate([0,0,0]) cylinder(r1=4.5,r2=3,h=5,$fn=32);
	translate([73-20,hloubka_dilu+3,tloustka_steny-0.1]) rotate([0,0,0]) cylinder(r1=4.5,r2=3,h=5,$fn=32);
}

module power_cuts(){
    // Vyrez pro zdroj
	translate([0,15,21]) cube([sirka,19,40]);
	// Otvor pro srouby k pridelani na zdroj
	translate([sirka/2,7,6+tloustka_steny]) rotate([0,90,0]) cylinder(r=1.8,h=200,$fn=16,center=true);
    translate([sirka/2,9.5,6+tloustka_steny]) rotate([0,90,0]) cylinder(r=1.8,h=200,$fn=16,center=true);
    translate([sirka/2,7+2.5/2,6+tloustka_steny]) cube([200,2.5,2*1.8],center=true);
    // Zkoseni
	translate([0,40,-0.1]) rotate([0,0,135]) cube([10,10,vyska]);
	translate([sirka,40,-0.1]) rotate([0,0,-45]) cube([10,10,vyska]);
	// Vyrez pro EURO konektor
	translate([73,hloubka_dilu+3,0]) rotate([180,0,0]) euro_konektor();
	// Vyrez pro vypinac
	translate([0,52,13]) rotate([0,90,0]) cube([19.2,13,10],center=true);
	// Text RebeliX
	translate([sirka/2,28,-0.1]) rotate([0,0,-180]) mirror([1,0,0]) text_RebeliX(3*layer_height+0.1);
	// Setreni plastem
	translate([sirka/2,0,0]) rotate([0,0,-90]) cube([30,sirka-20,10],center=true);
	translate([sirka/2-(sirka-20)/2,15,-0.1]) rotate([0,0,-110]) cube([30,20,10]);
	translate([sirka/2+(sirka-20)/2,15,-0.1]) rotate([0,0,200]) cube([30,20,10]);

}

module kryt_zdroje(){
	difference(){
	  power_base();
	  power_cuts();
	}
}

kryt_zdroje();
